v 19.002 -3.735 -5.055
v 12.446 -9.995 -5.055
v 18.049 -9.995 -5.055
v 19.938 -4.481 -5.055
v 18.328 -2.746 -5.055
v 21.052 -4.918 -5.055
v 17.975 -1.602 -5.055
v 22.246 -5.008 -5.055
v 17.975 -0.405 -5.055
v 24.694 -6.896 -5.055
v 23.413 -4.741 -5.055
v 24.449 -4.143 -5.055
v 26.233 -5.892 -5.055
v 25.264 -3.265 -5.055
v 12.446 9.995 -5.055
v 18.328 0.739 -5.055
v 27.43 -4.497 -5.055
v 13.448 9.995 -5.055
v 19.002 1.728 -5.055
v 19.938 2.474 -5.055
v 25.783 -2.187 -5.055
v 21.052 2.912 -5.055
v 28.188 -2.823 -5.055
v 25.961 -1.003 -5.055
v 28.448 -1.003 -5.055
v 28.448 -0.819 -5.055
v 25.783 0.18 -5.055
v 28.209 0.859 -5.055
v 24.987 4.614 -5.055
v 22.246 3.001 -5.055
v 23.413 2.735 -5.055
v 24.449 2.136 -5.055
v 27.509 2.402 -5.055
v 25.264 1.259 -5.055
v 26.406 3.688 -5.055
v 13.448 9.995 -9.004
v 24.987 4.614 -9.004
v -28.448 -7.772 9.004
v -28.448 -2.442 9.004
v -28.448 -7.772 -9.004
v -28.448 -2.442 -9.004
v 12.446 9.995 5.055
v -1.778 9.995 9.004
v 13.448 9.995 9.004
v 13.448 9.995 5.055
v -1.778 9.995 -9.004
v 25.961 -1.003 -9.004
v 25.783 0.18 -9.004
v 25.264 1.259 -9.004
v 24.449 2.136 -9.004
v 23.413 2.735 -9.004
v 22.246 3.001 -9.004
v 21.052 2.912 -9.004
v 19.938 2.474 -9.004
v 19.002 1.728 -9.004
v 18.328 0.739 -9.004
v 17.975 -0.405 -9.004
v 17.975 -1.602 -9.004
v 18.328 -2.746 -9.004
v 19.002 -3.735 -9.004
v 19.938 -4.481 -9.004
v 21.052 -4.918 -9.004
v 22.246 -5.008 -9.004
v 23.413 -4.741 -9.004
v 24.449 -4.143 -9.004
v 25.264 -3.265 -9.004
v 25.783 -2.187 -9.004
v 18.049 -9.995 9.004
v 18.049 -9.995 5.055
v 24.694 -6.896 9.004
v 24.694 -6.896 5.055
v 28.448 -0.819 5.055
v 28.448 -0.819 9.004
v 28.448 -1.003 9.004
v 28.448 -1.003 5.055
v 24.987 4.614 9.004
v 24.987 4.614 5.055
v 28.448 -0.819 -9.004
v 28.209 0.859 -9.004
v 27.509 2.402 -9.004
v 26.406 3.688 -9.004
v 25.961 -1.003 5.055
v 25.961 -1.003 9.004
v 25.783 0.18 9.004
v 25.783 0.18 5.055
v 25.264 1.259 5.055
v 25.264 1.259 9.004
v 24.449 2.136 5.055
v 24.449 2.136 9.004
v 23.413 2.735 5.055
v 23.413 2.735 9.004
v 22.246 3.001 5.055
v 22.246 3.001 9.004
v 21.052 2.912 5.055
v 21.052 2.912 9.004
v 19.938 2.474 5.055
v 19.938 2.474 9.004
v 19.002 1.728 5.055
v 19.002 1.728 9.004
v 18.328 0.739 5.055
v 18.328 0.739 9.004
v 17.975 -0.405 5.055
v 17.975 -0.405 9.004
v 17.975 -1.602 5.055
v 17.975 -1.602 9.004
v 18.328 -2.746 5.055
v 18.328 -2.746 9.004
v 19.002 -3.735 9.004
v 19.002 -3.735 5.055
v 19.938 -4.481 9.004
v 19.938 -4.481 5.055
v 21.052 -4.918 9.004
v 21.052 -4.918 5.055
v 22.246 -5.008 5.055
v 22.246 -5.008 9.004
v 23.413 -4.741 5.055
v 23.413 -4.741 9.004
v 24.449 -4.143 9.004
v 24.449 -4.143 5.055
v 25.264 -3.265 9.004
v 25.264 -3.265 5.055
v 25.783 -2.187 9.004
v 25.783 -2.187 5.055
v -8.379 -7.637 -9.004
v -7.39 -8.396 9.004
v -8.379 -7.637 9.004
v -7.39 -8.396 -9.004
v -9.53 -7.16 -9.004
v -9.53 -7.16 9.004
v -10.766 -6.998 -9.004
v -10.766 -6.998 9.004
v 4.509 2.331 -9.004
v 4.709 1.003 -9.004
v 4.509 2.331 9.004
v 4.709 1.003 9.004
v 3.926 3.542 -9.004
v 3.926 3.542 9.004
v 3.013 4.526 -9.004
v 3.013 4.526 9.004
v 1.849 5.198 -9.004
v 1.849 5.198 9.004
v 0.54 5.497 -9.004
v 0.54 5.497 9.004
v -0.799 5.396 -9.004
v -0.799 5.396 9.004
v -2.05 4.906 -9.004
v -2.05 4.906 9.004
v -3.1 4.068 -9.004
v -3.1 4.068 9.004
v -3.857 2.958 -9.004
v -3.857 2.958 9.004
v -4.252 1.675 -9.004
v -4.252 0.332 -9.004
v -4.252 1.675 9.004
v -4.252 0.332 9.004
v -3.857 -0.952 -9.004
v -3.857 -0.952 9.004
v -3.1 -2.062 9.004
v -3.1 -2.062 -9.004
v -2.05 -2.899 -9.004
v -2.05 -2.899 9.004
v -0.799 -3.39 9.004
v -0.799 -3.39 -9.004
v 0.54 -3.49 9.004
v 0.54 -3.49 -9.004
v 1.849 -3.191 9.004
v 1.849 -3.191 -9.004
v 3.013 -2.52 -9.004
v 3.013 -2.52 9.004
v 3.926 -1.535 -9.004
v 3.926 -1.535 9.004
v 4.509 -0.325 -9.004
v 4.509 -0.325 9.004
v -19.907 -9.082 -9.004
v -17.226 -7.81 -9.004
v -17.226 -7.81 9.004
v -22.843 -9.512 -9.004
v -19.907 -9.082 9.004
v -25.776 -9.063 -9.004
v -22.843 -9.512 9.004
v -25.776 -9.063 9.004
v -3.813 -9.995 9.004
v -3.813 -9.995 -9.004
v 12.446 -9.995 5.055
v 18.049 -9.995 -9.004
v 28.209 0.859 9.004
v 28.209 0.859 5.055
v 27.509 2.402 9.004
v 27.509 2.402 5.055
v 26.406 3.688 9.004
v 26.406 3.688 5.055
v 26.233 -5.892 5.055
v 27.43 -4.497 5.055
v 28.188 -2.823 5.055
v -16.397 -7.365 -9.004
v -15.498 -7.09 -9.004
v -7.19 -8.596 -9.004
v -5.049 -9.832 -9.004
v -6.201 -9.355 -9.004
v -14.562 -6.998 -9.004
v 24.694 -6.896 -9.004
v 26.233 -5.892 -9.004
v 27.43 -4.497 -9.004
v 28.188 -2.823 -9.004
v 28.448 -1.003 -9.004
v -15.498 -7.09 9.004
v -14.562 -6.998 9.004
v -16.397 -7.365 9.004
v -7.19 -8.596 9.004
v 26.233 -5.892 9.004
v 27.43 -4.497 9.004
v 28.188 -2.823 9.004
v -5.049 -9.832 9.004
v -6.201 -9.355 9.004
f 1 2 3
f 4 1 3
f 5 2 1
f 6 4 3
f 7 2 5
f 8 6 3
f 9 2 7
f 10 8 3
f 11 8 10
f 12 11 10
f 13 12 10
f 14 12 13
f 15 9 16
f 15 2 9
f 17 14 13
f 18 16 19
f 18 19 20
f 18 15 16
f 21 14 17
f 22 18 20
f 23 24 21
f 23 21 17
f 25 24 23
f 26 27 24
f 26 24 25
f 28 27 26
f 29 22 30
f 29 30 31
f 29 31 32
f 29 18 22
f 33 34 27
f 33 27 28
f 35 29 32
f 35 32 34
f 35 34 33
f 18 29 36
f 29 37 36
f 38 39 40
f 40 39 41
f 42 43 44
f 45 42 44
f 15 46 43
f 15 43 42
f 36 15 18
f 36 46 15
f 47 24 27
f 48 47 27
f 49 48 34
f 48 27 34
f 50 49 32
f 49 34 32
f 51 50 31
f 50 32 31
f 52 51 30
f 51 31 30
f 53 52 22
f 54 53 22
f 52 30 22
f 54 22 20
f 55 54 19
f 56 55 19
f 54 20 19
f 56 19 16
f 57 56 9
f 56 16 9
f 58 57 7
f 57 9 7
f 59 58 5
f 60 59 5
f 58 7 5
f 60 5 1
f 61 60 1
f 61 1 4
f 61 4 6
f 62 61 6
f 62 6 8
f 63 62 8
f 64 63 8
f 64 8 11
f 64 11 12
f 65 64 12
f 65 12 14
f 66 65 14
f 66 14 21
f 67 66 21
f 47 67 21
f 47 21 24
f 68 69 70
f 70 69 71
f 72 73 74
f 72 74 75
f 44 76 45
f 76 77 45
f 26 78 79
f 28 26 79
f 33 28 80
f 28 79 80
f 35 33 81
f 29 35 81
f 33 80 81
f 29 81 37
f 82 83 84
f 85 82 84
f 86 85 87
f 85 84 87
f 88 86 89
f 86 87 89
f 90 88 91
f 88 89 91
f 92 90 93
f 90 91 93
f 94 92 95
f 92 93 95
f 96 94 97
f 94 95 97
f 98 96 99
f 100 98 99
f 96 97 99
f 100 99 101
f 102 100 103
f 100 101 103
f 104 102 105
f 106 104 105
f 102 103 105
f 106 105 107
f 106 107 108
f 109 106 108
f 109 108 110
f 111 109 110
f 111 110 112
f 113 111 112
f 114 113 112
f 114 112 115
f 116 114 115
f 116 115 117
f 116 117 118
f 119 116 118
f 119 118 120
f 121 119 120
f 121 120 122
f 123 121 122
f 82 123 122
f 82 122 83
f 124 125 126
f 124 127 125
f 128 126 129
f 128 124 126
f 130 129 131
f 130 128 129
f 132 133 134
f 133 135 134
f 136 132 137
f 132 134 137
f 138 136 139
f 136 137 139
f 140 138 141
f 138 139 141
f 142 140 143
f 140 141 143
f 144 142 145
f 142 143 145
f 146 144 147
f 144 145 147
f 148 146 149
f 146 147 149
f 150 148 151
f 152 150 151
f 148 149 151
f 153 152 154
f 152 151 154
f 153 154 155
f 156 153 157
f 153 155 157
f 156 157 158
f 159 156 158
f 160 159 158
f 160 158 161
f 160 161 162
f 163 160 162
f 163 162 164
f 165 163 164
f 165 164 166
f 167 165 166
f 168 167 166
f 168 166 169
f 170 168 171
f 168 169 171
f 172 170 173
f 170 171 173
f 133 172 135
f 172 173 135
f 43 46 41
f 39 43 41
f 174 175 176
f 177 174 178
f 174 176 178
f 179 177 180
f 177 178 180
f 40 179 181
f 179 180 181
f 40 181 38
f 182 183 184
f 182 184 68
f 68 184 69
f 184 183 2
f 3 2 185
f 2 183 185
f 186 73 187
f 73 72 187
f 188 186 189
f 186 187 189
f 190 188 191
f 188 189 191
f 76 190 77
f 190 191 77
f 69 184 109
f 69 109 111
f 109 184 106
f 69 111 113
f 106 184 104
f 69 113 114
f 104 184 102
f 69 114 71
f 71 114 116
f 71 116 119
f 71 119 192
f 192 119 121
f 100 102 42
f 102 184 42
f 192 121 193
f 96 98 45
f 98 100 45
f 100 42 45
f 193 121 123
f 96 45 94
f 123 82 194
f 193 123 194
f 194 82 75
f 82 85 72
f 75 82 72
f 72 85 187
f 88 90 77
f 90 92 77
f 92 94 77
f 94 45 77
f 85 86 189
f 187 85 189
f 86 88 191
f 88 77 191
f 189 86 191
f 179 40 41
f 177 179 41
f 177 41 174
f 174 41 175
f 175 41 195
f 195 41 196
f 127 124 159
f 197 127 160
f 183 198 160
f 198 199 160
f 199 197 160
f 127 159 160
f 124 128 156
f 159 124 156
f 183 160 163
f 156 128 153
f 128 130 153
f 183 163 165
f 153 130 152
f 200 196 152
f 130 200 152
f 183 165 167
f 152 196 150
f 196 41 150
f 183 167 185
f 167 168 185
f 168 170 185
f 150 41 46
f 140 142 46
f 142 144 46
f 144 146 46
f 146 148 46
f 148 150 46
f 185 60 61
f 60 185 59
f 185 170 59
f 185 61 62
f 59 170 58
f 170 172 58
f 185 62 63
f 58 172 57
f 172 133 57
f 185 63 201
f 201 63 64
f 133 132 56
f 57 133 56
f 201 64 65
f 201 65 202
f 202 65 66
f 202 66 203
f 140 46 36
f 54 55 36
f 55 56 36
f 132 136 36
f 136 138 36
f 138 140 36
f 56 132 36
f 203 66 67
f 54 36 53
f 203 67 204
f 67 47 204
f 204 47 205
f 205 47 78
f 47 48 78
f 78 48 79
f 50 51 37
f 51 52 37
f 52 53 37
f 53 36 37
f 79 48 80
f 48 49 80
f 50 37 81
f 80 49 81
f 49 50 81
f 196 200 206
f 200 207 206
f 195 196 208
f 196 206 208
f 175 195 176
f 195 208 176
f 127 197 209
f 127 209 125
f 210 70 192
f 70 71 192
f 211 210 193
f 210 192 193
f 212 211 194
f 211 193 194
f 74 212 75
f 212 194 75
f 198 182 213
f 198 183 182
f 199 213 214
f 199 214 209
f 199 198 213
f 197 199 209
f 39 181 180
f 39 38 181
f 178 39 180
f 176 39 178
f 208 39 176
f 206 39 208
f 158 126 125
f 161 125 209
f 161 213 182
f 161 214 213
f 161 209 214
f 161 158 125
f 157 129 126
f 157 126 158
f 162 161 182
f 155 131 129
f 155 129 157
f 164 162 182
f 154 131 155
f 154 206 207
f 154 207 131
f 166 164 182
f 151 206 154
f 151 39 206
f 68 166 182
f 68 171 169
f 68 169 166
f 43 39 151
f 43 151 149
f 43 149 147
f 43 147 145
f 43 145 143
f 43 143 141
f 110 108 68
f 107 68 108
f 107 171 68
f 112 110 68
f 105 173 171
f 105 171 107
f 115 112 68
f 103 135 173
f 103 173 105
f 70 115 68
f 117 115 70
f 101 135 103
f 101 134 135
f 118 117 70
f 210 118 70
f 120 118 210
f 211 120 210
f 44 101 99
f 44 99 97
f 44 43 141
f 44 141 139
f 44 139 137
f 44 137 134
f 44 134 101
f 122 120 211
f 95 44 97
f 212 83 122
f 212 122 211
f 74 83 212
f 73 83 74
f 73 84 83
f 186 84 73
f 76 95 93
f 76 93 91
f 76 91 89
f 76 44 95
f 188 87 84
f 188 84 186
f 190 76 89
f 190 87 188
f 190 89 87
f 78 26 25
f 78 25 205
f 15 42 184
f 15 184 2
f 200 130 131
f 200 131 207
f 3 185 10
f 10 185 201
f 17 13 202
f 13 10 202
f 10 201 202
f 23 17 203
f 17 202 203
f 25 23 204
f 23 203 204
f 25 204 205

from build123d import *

# Parameters (mm, degrees)
SKETCH2_W               = 56.896
SKETCH2_H               = 18.0086
BOSS_EXTRUDE1_DEPTH     = 9.9949
SKETCH3_R               = 4.01574
SKETCH3_R_2             = 4.50596
CUT_EXTRUDE1_DEPTH      = 10.0043
CUT_EXTRUDE1_DEPTH_BACK = 10.0043
SKETCH5_OUTSIDE_W       = 71.484
SKETCH5_OUTSIDE_H       = 34.578
CUT_EXTRUDE2_DEPTH      = 10.0043
CUT_EXTRUDE2_DEPTH_BACK = 10.0043
CUT_EXTRUDE3_DEPTH      = 10.0043
CUT_EXTRUDE3_DEPTH_BACK = 10.0043
FILLET1_R               = 4.7752
SKETCH7_W               = 16.002
SKETCH7_H               = 10.1092
CUT_EXTRUDE4_DEPTH      = 10.9949
CUT_EXTRUDE4_DEPTH_BACK = 10.9949


with BuildPart() as part:
    # Sketch2 → Boss-Extrude1 (new body, symmetric)
    with BuildSketch(Plane(origin=(0, 0, 0), x_dir=(1, 0, 0), z_dir=(0, 1, 0))):
        Rectangle(SKETCH2_W, SKETCH2_H)
    extrude(amount=BOSS_EXTRUDE1_DEPTH, both=True)

    # Sketch3 → Cut-Extrude1 (cut, two sides)
    with BuildSketch(Plane.XY) as cut_extrude1_sk:
        with Locations((21.9456, -1.0033)):
            Circle(SKETCH3_R)
        with Locations((0.2032, 1.0033)):
            Circle(SKETCH3_R_2)
    extrude(amount=CUT_EXTRUDE1_DEPTH, mode=Mode.SUBTRACT)
    extrude(cut_extrude1_sk.sketch, amount=-CUT_EXTRUDE1_DEPTH_BACK, mode=Mode.SUBTRACT)

    # Sketch5 outside → Cut-Extrude2 (cut, two sides)
    with BuildSketch(Plane.XY) as cut_extrude2_sk:
        Rectangle(SKETCH5_OUTSIDE_W, SKETCH5_OUTSIDE_H)
        with BuildLine():
            Line((18.049040748, -9.9949), (24.693632985, -6.896475754))
            ThreePointArc((24.693632985, -6.896475754), (27.429668537, -4.497036973), (28.448, -1.0033))
            Line((28.448, -1.0033), (28.448, -0.818554854))
            ThreePointArc((28.448, -0.818554854), (27.509225683, 2.402233918), (24.986942908, 4.614216544))
            Line((24.986942908, 4.614216544), (13.44803, 9.9949))
            Line((13.44803, 9.9949), (-1.778, 9.9949))
            Line((-1.778, 9.9949), (-28.448, -2.441525243))
            Line((-28.448, -2.441525243), (-28.448, -9.9949))
            Line((-28.448, -9.9949), (18.049040748, -9.9949))
        make_face(mode=Mode.SUBTRACT)
    extrude(amount=CUT_EXTRUDE2_DEPTH, mode=Mode.SUBTRACT)
    extrude(cut_extrude2_sk.sketch, amount=-CUT_EXTRUDE2_DEPTH_BACK, mode=Mode.SUBTRACT)

    # Sketch6 → Cut-Extrude3 (cut, two sides)
    with BuildSketch(Plane.XY) as cut_extrude3_sk:
        with BuildLine():
            Line((-5.7912, -9.9949), (-8.7884, -6.9977))
            Line((-8.7884, -6.9977), (-16.175422135, -6.9977))
            ThreePointArc((-16.175422135, -6.9977), (-22.178675052, -9.492417259), (-28.448, -7.772468279))
            Line((-28.448, -7.772468279), (-28.448, -9.9949))
            Line((-28.448, -9.9949), (-5.7912, -9.9949))
        make_face()
    extrude(amount=CUT_EXTRUDE3_DEPTH, mode=Mode.SUBTRACT)
    extrude(cut_extrude3_sk.sketch, amount=-CUT_EXTRUDE3_DEPTH_BACK, mode=Mode.SUBTRACT)

    # Fillet1
    fillet1_edges = [part.edges().sort_by_distance(p)[0] for p in [
        (-16.175422135, -6.9977, 0),
        (-8.7884, -6.9977, 0),
        (-5.7912, -9.9949, 0),
    ]]
    fillet(fillet1_edges, radius=FILLET1_R)

    # Sketch7 → Cut-Extrude4 (cut, two sides)
    with BuildSketch(Plane(origin=(0, 0, 0), x_dir=(1, 0, 0), z_dir=(0, 1, 0))) as cut_extrude4_sk:
        with Locations((20.447, 0)):
            Rectangle(SKETCH7_W, SKETCH7_H)
    extrude(amount=CUT_EXTRUDE4_DEPTH, mode=Mode.SUBTRACT)
    extrude(cut_extrude4_sk.sketch, amount=-CUT_EXTRUDE4_DEPTH_BACK, mode=Mode.SUBTRACT)


solid = part.part
